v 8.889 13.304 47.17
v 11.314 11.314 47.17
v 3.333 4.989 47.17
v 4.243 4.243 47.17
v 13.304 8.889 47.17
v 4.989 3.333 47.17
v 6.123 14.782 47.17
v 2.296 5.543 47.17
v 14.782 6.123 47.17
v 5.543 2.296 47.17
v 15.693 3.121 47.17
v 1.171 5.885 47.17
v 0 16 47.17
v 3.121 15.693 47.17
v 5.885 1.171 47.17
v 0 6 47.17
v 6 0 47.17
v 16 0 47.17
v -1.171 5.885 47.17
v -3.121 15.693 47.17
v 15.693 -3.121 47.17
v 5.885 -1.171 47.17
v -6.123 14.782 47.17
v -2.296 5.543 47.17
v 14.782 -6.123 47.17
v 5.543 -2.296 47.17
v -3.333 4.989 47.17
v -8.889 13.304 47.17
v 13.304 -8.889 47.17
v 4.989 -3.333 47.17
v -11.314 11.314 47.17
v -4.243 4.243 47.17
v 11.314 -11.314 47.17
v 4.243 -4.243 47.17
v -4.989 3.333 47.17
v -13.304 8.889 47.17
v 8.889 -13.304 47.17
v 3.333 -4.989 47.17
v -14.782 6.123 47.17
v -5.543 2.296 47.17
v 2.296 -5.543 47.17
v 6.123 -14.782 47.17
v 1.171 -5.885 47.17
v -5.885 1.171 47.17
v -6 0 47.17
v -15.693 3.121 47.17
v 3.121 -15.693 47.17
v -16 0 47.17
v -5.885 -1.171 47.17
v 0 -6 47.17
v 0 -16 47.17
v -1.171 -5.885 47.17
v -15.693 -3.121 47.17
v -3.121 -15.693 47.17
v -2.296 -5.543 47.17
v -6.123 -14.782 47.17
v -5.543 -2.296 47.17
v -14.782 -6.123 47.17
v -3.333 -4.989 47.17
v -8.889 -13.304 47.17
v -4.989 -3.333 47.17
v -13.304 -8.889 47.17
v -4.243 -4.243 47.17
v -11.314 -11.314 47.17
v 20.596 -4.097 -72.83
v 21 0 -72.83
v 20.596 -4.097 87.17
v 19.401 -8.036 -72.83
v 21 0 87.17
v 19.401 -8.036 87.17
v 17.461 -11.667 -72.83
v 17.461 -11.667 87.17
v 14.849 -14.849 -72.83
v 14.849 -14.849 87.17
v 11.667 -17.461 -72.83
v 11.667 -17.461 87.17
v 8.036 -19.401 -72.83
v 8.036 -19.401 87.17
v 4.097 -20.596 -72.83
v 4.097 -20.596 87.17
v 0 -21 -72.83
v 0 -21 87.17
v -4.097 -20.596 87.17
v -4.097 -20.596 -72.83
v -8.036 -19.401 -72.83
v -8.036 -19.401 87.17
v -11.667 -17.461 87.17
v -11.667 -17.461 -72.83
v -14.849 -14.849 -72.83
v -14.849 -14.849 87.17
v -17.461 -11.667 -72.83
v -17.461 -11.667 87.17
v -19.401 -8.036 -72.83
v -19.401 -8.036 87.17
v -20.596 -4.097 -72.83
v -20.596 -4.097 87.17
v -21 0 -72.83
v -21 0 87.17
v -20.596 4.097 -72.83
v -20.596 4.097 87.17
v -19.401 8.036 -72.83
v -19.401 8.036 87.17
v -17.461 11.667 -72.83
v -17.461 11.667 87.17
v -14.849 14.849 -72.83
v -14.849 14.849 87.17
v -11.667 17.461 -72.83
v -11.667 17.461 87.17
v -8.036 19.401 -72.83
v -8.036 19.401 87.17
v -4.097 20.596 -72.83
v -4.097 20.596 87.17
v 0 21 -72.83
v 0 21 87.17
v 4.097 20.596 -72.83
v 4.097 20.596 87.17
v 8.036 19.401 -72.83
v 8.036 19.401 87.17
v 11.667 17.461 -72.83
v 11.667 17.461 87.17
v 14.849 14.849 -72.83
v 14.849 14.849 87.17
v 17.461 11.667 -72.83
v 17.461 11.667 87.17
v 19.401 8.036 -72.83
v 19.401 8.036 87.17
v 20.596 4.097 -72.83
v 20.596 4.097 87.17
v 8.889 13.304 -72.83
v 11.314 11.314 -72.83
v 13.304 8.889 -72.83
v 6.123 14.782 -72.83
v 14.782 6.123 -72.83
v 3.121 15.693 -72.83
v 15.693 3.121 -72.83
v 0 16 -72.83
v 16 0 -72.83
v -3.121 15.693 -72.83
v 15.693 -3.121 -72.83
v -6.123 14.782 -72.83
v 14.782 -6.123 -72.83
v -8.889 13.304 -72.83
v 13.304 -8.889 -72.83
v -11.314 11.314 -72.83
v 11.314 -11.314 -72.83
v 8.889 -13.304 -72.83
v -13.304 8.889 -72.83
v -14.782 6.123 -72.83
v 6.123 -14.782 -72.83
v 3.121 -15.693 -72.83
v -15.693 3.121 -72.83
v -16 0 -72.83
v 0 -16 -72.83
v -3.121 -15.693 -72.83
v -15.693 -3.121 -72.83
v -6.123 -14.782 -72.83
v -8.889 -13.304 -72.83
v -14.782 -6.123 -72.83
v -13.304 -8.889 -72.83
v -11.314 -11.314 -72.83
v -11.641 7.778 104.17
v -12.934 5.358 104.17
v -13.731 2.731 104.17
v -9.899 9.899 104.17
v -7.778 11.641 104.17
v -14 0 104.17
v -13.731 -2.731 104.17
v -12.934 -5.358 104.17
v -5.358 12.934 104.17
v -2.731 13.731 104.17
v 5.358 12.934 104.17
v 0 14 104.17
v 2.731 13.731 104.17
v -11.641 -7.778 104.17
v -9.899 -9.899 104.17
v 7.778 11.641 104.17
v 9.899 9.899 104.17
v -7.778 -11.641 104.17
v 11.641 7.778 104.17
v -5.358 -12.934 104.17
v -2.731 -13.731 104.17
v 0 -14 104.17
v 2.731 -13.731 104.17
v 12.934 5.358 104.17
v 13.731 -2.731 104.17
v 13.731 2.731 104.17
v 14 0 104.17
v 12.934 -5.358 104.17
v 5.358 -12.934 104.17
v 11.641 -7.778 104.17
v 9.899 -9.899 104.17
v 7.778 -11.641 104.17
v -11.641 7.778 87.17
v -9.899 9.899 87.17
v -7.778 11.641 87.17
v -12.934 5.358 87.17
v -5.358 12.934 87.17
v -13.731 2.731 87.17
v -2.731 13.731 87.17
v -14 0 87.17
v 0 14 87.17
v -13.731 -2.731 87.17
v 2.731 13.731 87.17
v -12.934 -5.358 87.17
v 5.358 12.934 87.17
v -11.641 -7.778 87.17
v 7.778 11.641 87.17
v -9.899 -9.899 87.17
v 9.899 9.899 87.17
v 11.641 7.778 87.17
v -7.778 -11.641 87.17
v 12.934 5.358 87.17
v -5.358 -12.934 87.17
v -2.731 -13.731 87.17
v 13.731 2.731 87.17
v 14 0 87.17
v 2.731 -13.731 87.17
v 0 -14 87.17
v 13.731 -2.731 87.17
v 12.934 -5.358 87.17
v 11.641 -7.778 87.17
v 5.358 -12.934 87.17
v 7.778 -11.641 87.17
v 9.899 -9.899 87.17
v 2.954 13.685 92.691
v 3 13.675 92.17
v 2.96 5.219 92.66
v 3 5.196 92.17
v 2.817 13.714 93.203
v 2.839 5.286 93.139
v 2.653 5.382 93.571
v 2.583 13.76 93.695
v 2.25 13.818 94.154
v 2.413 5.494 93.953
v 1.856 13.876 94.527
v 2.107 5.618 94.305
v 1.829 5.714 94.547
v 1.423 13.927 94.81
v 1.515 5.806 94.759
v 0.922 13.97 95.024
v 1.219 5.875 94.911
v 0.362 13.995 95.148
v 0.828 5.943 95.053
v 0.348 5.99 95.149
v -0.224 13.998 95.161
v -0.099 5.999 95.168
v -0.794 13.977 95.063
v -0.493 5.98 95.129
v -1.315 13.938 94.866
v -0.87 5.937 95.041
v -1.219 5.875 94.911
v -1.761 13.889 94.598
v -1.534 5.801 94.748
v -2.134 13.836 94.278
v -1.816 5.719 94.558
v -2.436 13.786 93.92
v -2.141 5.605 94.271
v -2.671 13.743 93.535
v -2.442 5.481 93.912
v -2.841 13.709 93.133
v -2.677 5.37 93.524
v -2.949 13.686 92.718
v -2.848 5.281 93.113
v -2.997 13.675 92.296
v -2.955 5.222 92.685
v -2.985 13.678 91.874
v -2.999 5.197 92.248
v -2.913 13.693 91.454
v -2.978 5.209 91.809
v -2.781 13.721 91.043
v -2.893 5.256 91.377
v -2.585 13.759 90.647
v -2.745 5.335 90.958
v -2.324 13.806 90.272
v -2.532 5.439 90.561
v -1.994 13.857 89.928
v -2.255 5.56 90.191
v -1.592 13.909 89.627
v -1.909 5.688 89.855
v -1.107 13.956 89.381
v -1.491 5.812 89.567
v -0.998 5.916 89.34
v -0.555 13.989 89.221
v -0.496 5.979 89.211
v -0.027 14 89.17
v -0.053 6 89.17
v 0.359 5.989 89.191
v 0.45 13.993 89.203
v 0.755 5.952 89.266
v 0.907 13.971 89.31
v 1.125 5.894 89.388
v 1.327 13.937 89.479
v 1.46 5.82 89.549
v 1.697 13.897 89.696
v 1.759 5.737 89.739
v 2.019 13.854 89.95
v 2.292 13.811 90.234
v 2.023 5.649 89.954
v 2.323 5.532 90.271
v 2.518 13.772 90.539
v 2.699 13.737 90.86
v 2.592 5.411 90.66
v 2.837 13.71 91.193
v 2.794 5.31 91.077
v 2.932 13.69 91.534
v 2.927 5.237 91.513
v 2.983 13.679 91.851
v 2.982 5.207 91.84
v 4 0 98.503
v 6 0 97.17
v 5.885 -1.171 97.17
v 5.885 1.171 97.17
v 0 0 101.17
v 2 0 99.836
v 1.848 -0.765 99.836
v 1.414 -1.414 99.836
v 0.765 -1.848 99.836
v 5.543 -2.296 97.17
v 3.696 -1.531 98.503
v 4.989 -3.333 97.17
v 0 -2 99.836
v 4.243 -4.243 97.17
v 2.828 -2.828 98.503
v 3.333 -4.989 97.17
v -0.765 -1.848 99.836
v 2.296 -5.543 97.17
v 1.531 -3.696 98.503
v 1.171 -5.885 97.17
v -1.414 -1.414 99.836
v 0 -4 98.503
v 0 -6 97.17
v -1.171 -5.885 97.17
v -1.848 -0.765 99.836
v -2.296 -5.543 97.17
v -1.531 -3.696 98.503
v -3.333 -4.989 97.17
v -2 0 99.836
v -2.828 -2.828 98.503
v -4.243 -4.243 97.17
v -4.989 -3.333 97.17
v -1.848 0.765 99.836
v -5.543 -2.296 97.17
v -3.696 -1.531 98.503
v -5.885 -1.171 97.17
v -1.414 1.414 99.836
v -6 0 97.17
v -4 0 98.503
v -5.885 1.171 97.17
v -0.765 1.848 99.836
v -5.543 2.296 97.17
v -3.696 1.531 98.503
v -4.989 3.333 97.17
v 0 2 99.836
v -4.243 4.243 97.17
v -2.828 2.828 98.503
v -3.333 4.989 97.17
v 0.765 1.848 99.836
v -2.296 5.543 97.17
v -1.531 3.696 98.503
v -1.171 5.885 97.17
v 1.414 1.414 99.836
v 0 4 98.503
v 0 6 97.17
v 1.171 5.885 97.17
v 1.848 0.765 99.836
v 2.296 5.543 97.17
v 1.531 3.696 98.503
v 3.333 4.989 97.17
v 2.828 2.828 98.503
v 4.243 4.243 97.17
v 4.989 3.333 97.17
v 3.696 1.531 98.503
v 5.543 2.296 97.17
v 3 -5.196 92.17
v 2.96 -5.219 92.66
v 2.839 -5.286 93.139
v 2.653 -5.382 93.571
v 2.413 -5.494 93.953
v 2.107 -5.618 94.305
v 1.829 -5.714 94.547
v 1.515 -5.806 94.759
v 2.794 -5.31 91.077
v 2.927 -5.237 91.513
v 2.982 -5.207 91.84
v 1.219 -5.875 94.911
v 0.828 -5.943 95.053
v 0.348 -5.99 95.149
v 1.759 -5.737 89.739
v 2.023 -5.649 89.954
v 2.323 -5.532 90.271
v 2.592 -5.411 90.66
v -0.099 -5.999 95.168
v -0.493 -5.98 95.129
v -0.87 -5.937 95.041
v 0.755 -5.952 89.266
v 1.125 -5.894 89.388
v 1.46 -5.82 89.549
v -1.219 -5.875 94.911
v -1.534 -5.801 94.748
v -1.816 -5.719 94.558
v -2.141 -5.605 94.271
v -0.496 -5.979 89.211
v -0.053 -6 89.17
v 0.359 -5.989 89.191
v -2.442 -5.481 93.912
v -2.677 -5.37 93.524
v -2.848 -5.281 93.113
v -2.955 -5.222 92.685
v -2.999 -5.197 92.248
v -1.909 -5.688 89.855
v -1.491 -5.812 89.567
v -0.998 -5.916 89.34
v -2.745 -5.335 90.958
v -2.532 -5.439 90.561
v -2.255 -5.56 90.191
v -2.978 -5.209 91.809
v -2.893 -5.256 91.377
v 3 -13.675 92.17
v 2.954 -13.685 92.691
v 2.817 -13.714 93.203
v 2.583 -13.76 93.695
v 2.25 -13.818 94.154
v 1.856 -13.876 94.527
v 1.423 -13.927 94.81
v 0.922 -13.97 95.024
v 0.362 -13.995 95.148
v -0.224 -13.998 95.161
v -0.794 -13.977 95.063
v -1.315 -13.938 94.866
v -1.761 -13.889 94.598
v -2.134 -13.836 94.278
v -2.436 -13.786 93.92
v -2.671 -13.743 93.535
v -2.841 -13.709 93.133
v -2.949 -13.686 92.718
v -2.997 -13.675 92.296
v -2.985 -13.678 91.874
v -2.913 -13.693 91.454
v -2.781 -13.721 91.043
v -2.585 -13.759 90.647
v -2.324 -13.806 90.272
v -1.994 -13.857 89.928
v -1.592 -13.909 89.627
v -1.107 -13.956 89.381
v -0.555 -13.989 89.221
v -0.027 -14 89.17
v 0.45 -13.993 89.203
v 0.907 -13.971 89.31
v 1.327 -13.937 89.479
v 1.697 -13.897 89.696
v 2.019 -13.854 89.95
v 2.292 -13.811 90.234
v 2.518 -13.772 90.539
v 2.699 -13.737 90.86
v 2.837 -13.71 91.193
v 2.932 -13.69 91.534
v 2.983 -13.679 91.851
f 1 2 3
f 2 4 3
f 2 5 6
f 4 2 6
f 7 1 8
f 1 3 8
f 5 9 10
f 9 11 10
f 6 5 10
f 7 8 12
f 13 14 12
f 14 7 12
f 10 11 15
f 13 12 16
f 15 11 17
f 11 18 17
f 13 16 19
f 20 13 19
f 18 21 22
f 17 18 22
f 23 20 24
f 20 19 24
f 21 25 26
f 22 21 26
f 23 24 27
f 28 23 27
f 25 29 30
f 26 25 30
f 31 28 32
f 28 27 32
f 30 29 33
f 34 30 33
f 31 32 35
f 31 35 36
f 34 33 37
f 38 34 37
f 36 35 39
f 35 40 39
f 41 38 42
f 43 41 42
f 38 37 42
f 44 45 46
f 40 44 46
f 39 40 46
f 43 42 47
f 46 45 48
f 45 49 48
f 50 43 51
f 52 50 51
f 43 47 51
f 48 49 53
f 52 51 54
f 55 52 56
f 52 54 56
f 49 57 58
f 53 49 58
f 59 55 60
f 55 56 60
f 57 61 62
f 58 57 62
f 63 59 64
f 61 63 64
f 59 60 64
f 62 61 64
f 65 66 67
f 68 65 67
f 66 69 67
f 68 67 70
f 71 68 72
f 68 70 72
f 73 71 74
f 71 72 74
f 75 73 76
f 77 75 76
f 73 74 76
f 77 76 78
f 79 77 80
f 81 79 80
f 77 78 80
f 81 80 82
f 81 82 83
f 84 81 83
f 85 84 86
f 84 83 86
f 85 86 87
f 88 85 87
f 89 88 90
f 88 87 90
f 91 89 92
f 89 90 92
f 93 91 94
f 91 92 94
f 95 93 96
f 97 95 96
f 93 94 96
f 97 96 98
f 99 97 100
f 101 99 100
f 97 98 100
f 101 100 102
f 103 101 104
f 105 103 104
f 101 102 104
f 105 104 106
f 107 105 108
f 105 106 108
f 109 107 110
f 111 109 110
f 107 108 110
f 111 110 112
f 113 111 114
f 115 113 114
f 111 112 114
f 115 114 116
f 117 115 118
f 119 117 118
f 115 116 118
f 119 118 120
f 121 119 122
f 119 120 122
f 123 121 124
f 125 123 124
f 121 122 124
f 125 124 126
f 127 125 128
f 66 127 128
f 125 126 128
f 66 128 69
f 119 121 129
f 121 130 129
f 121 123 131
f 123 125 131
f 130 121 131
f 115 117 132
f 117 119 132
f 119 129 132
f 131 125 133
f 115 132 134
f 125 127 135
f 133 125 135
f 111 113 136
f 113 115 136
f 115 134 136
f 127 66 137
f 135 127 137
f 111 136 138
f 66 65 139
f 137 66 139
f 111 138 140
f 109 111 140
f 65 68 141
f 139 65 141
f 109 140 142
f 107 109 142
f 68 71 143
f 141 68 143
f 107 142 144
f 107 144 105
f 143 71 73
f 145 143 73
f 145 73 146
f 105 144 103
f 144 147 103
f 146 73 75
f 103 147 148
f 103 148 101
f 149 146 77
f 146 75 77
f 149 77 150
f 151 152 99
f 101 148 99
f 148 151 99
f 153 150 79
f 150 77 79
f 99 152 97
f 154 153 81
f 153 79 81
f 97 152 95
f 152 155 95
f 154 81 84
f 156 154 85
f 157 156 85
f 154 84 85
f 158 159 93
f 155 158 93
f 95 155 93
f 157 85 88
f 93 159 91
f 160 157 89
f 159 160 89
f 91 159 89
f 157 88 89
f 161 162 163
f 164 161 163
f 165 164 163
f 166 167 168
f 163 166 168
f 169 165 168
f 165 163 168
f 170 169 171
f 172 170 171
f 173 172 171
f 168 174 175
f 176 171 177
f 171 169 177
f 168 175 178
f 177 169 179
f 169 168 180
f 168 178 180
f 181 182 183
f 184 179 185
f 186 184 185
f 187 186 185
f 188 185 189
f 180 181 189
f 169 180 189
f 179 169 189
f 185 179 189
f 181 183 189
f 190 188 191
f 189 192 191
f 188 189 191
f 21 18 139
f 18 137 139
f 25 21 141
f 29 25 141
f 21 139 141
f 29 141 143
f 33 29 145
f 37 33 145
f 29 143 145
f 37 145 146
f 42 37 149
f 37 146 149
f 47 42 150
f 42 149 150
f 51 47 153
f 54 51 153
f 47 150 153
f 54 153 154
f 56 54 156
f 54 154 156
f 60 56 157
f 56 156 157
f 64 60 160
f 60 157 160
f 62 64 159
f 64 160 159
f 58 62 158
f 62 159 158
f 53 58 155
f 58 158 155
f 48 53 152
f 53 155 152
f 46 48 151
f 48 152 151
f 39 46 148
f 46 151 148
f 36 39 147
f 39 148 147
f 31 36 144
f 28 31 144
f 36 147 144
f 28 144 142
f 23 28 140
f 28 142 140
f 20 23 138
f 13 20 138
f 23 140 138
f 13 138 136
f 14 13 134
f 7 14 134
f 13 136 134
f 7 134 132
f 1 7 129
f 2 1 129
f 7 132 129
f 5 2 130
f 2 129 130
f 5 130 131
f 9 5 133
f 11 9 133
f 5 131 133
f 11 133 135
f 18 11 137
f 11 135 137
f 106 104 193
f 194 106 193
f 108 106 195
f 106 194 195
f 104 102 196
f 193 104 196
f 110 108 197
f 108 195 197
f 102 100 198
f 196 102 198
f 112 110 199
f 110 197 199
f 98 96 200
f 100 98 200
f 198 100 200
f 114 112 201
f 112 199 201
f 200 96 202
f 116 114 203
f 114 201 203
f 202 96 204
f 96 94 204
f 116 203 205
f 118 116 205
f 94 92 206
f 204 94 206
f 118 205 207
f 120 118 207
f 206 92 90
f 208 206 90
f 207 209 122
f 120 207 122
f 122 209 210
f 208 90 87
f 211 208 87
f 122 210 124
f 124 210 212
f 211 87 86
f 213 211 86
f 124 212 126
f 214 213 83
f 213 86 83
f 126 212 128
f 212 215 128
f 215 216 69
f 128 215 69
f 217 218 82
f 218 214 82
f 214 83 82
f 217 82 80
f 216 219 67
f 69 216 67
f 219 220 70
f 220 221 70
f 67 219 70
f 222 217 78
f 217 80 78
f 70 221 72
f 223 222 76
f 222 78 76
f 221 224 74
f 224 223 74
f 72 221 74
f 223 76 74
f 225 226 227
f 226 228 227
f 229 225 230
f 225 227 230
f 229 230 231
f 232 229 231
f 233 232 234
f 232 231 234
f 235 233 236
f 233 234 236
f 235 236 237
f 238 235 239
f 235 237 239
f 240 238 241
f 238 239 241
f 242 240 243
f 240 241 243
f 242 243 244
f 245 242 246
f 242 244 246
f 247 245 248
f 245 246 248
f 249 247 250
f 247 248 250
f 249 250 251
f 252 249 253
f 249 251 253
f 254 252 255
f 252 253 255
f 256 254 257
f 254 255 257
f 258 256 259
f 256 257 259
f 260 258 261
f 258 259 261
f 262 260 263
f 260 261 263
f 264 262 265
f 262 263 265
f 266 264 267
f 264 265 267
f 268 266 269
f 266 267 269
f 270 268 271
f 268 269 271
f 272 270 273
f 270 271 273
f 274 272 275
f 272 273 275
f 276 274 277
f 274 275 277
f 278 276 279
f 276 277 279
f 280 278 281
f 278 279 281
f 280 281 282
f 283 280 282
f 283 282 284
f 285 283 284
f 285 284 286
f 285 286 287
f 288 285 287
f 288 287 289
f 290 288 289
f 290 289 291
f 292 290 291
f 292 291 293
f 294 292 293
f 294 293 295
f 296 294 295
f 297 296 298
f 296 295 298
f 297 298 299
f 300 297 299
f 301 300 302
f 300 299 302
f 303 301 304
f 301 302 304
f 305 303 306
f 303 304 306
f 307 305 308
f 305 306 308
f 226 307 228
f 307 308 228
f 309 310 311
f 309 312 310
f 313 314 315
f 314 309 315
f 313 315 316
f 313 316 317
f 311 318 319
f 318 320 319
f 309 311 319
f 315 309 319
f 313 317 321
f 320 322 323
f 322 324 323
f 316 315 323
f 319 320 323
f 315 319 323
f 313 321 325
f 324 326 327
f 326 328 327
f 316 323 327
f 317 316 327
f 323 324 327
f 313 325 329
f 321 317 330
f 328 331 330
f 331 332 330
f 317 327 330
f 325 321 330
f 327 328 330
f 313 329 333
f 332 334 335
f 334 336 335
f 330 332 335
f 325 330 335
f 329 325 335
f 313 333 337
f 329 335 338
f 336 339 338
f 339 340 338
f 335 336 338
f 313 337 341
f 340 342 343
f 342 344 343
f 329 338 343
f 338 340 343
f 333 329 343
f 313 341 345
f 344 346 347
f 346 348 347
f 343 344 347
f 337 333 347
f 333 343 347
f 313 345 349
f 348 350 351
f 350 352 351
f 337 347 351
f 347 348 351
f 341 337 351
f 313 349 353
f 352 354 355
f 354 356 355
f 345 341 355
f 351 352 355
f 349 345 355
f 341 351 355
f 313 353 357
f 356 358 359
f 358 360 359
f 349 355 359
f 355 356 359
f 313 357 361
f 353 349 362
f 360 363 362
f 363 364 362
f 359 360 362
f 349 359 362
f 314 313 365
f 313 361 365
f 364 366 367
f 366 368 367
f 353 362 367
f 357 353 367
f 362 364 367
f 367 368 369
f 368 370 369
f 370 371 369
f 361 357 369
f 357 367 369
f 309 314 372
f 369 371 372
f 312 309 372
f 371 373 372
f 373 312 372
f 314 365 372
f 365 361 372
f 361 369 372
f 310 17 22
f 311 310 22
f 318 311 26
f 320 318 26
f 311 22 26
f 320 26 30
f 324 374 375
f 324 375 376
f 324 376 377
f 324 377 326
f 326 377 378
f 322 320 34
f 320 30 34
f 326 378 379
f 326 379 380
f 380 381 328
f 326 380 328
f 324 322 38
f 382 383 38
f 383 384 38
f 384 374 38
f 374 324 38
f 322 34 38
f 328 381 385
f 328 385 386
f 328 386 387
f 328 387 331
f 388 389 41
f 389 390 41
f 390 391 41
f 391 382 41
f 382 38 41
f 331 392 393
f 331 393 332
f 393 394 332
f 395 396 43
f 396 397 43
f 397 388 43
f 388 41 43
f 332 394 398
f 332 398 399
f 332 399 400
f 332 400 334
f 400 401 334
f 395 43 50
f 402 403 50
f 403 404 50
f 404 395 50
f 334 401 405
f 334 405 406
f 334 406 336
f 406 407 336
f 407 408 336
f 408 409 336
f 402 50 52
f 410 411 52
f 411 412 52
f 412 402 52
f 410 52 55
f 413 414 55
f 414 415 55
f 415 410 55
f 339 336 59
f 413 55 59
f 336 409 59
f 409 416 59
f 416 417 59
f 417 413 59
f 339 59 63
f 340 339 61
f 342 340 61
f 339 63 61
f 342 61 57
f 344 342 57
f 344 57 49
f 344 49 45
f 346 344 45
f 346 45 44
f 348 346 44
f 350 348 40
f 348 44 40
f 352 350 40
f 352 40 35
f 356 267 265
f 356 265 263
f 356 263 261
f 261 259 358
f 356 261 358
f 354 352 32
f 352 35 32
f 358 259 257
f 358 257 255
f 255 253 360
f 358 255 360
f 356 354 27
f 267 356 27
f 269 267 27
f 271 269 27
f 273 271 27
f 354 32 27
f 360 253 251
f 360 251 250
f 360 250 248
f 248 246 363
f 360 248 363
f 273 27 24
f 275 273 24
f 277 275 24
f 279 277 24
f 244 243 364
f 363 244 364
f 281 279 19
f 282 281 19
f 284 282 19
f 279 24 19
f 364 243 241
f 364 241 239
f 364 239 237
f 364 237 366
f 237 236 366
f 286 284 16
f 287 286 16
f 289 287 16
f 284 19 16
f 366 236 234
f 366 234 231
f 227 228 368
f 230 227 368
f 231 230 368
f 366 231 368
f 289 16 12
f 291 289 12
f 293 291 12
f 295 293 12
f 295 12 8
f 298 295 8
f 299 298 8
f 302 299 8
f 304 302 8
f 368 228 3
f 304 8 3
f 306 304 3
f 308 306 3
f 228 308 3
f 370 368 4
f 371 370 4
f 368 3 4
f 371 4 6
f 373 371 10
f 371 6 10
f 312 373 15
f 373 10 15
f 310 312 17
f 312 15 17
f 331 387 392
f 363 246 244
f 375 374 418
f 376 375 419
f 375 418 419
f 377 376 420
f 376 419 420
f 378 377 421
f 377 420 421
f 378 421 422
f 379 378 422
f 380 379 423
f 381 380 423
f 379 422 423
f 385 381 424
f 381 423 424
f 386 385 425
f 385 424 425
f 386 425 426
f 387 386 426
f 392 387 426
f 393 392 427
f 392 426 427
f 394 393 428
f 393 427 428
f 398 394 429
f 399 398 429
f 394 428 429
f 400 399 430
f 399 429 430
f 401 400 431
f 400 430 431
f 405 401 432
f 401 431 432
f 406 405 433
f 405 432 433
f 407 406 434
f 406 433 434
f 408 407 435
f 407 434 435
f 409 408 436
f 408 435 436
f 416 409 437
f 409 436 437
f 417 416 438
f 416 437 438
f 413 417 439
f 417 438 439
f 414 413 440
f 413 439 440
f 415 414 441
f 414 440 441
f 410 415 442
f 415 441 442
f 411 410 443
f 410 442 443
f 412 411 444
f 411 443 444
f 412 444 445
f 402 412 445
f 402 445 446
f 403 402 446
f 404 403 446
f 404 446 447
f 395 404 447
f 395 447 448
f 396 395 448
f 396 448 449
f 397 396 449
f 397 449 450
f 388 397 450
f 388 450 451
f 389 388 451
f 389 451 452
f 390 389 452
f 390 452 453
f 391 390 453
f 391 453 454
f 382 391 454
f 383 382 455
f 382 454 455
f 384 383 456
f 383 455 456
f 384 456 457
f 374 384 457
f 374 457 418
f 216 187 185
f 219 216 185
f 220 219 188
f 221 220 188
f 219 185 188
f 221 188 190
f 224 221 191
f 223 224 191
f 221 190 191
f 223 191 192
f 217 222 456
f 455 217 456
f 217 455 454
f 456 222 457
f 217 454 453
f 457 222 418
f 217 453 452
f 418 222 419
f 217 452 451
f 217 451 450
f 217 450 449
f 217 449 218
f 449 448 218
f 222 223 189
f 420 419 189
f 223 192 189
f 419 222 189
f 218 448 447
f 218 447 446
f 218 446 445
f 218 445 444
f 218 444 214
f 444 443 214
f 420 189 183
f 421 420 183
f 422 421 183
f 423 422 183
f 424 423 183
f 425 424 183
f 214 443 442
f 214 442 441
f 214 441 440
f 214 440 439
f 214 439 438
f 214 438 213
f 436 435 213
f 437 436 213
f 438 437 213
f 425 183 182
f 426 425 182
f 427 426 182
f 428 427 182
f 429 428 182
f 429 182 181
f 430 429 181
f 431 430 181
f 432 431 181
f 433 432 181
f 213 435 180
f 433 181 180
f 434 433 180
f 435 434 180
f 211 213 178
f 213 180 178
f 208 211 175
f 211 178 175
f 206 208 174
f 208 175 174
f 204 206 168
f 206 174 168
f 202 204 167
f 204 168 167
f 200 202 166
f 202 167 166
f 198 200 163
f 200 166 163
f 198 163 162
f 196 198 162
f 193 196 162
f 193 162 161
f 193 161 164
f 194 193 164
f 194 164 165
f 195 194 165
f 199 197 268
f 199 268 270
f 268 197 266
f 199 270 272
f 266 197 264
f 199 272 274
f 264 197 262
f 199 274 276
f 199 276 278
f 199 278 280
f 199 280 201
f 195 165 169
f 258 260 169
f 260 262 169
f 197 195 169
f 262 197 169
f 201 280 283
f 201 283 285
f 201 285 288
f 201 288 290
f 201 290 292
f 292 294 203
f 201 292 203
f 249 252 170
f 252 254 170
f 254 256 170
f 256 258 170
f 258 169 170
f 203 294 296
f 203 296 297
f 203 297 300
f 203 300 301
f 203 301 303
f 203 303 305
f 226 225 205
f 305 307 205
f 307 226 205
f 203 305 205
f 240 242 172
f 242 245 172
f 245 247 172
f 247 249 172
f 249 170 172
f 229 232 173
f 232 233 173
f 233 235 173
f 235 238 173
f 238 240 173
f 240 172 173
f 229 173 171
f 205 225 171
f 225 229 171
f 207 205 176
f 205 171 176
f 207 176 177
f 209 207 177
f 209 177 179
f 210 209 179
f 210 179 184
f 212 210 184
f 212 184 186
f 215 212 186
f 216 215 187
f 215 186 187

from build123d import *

# Parameters (mm, degrees)
F2_R     = 3
F3_DEPTH = 25


with BuildPart() as f1:
    # F0 (on Front) → F1 (revolve)
    with BuildSketch(Plane.XZ):
        Polygon((16, 47.169506), (16, -72.830494), (21, -72.830494), (21, 87.169506), (14, 87.169506), (14, 97.169506), (14, 104.169506), (0, 104.169506), (0, 101.169506), (6, 97.169506), (6, 47.169506), align=None)
    revolve(axis=Axis((0, 0, -1.18644), (0, 0, -1)))

    # F2 (on Front) → F3 (cut, symmetric)
    with BuildSketch(Plane.XZ):
        with Locations((0, 92.169506)):
            Circle(F2_R)
    extrude(amount=F3_DEPTH, both=True, mode=Mode.SUBTRACT)


solid = f1.part
